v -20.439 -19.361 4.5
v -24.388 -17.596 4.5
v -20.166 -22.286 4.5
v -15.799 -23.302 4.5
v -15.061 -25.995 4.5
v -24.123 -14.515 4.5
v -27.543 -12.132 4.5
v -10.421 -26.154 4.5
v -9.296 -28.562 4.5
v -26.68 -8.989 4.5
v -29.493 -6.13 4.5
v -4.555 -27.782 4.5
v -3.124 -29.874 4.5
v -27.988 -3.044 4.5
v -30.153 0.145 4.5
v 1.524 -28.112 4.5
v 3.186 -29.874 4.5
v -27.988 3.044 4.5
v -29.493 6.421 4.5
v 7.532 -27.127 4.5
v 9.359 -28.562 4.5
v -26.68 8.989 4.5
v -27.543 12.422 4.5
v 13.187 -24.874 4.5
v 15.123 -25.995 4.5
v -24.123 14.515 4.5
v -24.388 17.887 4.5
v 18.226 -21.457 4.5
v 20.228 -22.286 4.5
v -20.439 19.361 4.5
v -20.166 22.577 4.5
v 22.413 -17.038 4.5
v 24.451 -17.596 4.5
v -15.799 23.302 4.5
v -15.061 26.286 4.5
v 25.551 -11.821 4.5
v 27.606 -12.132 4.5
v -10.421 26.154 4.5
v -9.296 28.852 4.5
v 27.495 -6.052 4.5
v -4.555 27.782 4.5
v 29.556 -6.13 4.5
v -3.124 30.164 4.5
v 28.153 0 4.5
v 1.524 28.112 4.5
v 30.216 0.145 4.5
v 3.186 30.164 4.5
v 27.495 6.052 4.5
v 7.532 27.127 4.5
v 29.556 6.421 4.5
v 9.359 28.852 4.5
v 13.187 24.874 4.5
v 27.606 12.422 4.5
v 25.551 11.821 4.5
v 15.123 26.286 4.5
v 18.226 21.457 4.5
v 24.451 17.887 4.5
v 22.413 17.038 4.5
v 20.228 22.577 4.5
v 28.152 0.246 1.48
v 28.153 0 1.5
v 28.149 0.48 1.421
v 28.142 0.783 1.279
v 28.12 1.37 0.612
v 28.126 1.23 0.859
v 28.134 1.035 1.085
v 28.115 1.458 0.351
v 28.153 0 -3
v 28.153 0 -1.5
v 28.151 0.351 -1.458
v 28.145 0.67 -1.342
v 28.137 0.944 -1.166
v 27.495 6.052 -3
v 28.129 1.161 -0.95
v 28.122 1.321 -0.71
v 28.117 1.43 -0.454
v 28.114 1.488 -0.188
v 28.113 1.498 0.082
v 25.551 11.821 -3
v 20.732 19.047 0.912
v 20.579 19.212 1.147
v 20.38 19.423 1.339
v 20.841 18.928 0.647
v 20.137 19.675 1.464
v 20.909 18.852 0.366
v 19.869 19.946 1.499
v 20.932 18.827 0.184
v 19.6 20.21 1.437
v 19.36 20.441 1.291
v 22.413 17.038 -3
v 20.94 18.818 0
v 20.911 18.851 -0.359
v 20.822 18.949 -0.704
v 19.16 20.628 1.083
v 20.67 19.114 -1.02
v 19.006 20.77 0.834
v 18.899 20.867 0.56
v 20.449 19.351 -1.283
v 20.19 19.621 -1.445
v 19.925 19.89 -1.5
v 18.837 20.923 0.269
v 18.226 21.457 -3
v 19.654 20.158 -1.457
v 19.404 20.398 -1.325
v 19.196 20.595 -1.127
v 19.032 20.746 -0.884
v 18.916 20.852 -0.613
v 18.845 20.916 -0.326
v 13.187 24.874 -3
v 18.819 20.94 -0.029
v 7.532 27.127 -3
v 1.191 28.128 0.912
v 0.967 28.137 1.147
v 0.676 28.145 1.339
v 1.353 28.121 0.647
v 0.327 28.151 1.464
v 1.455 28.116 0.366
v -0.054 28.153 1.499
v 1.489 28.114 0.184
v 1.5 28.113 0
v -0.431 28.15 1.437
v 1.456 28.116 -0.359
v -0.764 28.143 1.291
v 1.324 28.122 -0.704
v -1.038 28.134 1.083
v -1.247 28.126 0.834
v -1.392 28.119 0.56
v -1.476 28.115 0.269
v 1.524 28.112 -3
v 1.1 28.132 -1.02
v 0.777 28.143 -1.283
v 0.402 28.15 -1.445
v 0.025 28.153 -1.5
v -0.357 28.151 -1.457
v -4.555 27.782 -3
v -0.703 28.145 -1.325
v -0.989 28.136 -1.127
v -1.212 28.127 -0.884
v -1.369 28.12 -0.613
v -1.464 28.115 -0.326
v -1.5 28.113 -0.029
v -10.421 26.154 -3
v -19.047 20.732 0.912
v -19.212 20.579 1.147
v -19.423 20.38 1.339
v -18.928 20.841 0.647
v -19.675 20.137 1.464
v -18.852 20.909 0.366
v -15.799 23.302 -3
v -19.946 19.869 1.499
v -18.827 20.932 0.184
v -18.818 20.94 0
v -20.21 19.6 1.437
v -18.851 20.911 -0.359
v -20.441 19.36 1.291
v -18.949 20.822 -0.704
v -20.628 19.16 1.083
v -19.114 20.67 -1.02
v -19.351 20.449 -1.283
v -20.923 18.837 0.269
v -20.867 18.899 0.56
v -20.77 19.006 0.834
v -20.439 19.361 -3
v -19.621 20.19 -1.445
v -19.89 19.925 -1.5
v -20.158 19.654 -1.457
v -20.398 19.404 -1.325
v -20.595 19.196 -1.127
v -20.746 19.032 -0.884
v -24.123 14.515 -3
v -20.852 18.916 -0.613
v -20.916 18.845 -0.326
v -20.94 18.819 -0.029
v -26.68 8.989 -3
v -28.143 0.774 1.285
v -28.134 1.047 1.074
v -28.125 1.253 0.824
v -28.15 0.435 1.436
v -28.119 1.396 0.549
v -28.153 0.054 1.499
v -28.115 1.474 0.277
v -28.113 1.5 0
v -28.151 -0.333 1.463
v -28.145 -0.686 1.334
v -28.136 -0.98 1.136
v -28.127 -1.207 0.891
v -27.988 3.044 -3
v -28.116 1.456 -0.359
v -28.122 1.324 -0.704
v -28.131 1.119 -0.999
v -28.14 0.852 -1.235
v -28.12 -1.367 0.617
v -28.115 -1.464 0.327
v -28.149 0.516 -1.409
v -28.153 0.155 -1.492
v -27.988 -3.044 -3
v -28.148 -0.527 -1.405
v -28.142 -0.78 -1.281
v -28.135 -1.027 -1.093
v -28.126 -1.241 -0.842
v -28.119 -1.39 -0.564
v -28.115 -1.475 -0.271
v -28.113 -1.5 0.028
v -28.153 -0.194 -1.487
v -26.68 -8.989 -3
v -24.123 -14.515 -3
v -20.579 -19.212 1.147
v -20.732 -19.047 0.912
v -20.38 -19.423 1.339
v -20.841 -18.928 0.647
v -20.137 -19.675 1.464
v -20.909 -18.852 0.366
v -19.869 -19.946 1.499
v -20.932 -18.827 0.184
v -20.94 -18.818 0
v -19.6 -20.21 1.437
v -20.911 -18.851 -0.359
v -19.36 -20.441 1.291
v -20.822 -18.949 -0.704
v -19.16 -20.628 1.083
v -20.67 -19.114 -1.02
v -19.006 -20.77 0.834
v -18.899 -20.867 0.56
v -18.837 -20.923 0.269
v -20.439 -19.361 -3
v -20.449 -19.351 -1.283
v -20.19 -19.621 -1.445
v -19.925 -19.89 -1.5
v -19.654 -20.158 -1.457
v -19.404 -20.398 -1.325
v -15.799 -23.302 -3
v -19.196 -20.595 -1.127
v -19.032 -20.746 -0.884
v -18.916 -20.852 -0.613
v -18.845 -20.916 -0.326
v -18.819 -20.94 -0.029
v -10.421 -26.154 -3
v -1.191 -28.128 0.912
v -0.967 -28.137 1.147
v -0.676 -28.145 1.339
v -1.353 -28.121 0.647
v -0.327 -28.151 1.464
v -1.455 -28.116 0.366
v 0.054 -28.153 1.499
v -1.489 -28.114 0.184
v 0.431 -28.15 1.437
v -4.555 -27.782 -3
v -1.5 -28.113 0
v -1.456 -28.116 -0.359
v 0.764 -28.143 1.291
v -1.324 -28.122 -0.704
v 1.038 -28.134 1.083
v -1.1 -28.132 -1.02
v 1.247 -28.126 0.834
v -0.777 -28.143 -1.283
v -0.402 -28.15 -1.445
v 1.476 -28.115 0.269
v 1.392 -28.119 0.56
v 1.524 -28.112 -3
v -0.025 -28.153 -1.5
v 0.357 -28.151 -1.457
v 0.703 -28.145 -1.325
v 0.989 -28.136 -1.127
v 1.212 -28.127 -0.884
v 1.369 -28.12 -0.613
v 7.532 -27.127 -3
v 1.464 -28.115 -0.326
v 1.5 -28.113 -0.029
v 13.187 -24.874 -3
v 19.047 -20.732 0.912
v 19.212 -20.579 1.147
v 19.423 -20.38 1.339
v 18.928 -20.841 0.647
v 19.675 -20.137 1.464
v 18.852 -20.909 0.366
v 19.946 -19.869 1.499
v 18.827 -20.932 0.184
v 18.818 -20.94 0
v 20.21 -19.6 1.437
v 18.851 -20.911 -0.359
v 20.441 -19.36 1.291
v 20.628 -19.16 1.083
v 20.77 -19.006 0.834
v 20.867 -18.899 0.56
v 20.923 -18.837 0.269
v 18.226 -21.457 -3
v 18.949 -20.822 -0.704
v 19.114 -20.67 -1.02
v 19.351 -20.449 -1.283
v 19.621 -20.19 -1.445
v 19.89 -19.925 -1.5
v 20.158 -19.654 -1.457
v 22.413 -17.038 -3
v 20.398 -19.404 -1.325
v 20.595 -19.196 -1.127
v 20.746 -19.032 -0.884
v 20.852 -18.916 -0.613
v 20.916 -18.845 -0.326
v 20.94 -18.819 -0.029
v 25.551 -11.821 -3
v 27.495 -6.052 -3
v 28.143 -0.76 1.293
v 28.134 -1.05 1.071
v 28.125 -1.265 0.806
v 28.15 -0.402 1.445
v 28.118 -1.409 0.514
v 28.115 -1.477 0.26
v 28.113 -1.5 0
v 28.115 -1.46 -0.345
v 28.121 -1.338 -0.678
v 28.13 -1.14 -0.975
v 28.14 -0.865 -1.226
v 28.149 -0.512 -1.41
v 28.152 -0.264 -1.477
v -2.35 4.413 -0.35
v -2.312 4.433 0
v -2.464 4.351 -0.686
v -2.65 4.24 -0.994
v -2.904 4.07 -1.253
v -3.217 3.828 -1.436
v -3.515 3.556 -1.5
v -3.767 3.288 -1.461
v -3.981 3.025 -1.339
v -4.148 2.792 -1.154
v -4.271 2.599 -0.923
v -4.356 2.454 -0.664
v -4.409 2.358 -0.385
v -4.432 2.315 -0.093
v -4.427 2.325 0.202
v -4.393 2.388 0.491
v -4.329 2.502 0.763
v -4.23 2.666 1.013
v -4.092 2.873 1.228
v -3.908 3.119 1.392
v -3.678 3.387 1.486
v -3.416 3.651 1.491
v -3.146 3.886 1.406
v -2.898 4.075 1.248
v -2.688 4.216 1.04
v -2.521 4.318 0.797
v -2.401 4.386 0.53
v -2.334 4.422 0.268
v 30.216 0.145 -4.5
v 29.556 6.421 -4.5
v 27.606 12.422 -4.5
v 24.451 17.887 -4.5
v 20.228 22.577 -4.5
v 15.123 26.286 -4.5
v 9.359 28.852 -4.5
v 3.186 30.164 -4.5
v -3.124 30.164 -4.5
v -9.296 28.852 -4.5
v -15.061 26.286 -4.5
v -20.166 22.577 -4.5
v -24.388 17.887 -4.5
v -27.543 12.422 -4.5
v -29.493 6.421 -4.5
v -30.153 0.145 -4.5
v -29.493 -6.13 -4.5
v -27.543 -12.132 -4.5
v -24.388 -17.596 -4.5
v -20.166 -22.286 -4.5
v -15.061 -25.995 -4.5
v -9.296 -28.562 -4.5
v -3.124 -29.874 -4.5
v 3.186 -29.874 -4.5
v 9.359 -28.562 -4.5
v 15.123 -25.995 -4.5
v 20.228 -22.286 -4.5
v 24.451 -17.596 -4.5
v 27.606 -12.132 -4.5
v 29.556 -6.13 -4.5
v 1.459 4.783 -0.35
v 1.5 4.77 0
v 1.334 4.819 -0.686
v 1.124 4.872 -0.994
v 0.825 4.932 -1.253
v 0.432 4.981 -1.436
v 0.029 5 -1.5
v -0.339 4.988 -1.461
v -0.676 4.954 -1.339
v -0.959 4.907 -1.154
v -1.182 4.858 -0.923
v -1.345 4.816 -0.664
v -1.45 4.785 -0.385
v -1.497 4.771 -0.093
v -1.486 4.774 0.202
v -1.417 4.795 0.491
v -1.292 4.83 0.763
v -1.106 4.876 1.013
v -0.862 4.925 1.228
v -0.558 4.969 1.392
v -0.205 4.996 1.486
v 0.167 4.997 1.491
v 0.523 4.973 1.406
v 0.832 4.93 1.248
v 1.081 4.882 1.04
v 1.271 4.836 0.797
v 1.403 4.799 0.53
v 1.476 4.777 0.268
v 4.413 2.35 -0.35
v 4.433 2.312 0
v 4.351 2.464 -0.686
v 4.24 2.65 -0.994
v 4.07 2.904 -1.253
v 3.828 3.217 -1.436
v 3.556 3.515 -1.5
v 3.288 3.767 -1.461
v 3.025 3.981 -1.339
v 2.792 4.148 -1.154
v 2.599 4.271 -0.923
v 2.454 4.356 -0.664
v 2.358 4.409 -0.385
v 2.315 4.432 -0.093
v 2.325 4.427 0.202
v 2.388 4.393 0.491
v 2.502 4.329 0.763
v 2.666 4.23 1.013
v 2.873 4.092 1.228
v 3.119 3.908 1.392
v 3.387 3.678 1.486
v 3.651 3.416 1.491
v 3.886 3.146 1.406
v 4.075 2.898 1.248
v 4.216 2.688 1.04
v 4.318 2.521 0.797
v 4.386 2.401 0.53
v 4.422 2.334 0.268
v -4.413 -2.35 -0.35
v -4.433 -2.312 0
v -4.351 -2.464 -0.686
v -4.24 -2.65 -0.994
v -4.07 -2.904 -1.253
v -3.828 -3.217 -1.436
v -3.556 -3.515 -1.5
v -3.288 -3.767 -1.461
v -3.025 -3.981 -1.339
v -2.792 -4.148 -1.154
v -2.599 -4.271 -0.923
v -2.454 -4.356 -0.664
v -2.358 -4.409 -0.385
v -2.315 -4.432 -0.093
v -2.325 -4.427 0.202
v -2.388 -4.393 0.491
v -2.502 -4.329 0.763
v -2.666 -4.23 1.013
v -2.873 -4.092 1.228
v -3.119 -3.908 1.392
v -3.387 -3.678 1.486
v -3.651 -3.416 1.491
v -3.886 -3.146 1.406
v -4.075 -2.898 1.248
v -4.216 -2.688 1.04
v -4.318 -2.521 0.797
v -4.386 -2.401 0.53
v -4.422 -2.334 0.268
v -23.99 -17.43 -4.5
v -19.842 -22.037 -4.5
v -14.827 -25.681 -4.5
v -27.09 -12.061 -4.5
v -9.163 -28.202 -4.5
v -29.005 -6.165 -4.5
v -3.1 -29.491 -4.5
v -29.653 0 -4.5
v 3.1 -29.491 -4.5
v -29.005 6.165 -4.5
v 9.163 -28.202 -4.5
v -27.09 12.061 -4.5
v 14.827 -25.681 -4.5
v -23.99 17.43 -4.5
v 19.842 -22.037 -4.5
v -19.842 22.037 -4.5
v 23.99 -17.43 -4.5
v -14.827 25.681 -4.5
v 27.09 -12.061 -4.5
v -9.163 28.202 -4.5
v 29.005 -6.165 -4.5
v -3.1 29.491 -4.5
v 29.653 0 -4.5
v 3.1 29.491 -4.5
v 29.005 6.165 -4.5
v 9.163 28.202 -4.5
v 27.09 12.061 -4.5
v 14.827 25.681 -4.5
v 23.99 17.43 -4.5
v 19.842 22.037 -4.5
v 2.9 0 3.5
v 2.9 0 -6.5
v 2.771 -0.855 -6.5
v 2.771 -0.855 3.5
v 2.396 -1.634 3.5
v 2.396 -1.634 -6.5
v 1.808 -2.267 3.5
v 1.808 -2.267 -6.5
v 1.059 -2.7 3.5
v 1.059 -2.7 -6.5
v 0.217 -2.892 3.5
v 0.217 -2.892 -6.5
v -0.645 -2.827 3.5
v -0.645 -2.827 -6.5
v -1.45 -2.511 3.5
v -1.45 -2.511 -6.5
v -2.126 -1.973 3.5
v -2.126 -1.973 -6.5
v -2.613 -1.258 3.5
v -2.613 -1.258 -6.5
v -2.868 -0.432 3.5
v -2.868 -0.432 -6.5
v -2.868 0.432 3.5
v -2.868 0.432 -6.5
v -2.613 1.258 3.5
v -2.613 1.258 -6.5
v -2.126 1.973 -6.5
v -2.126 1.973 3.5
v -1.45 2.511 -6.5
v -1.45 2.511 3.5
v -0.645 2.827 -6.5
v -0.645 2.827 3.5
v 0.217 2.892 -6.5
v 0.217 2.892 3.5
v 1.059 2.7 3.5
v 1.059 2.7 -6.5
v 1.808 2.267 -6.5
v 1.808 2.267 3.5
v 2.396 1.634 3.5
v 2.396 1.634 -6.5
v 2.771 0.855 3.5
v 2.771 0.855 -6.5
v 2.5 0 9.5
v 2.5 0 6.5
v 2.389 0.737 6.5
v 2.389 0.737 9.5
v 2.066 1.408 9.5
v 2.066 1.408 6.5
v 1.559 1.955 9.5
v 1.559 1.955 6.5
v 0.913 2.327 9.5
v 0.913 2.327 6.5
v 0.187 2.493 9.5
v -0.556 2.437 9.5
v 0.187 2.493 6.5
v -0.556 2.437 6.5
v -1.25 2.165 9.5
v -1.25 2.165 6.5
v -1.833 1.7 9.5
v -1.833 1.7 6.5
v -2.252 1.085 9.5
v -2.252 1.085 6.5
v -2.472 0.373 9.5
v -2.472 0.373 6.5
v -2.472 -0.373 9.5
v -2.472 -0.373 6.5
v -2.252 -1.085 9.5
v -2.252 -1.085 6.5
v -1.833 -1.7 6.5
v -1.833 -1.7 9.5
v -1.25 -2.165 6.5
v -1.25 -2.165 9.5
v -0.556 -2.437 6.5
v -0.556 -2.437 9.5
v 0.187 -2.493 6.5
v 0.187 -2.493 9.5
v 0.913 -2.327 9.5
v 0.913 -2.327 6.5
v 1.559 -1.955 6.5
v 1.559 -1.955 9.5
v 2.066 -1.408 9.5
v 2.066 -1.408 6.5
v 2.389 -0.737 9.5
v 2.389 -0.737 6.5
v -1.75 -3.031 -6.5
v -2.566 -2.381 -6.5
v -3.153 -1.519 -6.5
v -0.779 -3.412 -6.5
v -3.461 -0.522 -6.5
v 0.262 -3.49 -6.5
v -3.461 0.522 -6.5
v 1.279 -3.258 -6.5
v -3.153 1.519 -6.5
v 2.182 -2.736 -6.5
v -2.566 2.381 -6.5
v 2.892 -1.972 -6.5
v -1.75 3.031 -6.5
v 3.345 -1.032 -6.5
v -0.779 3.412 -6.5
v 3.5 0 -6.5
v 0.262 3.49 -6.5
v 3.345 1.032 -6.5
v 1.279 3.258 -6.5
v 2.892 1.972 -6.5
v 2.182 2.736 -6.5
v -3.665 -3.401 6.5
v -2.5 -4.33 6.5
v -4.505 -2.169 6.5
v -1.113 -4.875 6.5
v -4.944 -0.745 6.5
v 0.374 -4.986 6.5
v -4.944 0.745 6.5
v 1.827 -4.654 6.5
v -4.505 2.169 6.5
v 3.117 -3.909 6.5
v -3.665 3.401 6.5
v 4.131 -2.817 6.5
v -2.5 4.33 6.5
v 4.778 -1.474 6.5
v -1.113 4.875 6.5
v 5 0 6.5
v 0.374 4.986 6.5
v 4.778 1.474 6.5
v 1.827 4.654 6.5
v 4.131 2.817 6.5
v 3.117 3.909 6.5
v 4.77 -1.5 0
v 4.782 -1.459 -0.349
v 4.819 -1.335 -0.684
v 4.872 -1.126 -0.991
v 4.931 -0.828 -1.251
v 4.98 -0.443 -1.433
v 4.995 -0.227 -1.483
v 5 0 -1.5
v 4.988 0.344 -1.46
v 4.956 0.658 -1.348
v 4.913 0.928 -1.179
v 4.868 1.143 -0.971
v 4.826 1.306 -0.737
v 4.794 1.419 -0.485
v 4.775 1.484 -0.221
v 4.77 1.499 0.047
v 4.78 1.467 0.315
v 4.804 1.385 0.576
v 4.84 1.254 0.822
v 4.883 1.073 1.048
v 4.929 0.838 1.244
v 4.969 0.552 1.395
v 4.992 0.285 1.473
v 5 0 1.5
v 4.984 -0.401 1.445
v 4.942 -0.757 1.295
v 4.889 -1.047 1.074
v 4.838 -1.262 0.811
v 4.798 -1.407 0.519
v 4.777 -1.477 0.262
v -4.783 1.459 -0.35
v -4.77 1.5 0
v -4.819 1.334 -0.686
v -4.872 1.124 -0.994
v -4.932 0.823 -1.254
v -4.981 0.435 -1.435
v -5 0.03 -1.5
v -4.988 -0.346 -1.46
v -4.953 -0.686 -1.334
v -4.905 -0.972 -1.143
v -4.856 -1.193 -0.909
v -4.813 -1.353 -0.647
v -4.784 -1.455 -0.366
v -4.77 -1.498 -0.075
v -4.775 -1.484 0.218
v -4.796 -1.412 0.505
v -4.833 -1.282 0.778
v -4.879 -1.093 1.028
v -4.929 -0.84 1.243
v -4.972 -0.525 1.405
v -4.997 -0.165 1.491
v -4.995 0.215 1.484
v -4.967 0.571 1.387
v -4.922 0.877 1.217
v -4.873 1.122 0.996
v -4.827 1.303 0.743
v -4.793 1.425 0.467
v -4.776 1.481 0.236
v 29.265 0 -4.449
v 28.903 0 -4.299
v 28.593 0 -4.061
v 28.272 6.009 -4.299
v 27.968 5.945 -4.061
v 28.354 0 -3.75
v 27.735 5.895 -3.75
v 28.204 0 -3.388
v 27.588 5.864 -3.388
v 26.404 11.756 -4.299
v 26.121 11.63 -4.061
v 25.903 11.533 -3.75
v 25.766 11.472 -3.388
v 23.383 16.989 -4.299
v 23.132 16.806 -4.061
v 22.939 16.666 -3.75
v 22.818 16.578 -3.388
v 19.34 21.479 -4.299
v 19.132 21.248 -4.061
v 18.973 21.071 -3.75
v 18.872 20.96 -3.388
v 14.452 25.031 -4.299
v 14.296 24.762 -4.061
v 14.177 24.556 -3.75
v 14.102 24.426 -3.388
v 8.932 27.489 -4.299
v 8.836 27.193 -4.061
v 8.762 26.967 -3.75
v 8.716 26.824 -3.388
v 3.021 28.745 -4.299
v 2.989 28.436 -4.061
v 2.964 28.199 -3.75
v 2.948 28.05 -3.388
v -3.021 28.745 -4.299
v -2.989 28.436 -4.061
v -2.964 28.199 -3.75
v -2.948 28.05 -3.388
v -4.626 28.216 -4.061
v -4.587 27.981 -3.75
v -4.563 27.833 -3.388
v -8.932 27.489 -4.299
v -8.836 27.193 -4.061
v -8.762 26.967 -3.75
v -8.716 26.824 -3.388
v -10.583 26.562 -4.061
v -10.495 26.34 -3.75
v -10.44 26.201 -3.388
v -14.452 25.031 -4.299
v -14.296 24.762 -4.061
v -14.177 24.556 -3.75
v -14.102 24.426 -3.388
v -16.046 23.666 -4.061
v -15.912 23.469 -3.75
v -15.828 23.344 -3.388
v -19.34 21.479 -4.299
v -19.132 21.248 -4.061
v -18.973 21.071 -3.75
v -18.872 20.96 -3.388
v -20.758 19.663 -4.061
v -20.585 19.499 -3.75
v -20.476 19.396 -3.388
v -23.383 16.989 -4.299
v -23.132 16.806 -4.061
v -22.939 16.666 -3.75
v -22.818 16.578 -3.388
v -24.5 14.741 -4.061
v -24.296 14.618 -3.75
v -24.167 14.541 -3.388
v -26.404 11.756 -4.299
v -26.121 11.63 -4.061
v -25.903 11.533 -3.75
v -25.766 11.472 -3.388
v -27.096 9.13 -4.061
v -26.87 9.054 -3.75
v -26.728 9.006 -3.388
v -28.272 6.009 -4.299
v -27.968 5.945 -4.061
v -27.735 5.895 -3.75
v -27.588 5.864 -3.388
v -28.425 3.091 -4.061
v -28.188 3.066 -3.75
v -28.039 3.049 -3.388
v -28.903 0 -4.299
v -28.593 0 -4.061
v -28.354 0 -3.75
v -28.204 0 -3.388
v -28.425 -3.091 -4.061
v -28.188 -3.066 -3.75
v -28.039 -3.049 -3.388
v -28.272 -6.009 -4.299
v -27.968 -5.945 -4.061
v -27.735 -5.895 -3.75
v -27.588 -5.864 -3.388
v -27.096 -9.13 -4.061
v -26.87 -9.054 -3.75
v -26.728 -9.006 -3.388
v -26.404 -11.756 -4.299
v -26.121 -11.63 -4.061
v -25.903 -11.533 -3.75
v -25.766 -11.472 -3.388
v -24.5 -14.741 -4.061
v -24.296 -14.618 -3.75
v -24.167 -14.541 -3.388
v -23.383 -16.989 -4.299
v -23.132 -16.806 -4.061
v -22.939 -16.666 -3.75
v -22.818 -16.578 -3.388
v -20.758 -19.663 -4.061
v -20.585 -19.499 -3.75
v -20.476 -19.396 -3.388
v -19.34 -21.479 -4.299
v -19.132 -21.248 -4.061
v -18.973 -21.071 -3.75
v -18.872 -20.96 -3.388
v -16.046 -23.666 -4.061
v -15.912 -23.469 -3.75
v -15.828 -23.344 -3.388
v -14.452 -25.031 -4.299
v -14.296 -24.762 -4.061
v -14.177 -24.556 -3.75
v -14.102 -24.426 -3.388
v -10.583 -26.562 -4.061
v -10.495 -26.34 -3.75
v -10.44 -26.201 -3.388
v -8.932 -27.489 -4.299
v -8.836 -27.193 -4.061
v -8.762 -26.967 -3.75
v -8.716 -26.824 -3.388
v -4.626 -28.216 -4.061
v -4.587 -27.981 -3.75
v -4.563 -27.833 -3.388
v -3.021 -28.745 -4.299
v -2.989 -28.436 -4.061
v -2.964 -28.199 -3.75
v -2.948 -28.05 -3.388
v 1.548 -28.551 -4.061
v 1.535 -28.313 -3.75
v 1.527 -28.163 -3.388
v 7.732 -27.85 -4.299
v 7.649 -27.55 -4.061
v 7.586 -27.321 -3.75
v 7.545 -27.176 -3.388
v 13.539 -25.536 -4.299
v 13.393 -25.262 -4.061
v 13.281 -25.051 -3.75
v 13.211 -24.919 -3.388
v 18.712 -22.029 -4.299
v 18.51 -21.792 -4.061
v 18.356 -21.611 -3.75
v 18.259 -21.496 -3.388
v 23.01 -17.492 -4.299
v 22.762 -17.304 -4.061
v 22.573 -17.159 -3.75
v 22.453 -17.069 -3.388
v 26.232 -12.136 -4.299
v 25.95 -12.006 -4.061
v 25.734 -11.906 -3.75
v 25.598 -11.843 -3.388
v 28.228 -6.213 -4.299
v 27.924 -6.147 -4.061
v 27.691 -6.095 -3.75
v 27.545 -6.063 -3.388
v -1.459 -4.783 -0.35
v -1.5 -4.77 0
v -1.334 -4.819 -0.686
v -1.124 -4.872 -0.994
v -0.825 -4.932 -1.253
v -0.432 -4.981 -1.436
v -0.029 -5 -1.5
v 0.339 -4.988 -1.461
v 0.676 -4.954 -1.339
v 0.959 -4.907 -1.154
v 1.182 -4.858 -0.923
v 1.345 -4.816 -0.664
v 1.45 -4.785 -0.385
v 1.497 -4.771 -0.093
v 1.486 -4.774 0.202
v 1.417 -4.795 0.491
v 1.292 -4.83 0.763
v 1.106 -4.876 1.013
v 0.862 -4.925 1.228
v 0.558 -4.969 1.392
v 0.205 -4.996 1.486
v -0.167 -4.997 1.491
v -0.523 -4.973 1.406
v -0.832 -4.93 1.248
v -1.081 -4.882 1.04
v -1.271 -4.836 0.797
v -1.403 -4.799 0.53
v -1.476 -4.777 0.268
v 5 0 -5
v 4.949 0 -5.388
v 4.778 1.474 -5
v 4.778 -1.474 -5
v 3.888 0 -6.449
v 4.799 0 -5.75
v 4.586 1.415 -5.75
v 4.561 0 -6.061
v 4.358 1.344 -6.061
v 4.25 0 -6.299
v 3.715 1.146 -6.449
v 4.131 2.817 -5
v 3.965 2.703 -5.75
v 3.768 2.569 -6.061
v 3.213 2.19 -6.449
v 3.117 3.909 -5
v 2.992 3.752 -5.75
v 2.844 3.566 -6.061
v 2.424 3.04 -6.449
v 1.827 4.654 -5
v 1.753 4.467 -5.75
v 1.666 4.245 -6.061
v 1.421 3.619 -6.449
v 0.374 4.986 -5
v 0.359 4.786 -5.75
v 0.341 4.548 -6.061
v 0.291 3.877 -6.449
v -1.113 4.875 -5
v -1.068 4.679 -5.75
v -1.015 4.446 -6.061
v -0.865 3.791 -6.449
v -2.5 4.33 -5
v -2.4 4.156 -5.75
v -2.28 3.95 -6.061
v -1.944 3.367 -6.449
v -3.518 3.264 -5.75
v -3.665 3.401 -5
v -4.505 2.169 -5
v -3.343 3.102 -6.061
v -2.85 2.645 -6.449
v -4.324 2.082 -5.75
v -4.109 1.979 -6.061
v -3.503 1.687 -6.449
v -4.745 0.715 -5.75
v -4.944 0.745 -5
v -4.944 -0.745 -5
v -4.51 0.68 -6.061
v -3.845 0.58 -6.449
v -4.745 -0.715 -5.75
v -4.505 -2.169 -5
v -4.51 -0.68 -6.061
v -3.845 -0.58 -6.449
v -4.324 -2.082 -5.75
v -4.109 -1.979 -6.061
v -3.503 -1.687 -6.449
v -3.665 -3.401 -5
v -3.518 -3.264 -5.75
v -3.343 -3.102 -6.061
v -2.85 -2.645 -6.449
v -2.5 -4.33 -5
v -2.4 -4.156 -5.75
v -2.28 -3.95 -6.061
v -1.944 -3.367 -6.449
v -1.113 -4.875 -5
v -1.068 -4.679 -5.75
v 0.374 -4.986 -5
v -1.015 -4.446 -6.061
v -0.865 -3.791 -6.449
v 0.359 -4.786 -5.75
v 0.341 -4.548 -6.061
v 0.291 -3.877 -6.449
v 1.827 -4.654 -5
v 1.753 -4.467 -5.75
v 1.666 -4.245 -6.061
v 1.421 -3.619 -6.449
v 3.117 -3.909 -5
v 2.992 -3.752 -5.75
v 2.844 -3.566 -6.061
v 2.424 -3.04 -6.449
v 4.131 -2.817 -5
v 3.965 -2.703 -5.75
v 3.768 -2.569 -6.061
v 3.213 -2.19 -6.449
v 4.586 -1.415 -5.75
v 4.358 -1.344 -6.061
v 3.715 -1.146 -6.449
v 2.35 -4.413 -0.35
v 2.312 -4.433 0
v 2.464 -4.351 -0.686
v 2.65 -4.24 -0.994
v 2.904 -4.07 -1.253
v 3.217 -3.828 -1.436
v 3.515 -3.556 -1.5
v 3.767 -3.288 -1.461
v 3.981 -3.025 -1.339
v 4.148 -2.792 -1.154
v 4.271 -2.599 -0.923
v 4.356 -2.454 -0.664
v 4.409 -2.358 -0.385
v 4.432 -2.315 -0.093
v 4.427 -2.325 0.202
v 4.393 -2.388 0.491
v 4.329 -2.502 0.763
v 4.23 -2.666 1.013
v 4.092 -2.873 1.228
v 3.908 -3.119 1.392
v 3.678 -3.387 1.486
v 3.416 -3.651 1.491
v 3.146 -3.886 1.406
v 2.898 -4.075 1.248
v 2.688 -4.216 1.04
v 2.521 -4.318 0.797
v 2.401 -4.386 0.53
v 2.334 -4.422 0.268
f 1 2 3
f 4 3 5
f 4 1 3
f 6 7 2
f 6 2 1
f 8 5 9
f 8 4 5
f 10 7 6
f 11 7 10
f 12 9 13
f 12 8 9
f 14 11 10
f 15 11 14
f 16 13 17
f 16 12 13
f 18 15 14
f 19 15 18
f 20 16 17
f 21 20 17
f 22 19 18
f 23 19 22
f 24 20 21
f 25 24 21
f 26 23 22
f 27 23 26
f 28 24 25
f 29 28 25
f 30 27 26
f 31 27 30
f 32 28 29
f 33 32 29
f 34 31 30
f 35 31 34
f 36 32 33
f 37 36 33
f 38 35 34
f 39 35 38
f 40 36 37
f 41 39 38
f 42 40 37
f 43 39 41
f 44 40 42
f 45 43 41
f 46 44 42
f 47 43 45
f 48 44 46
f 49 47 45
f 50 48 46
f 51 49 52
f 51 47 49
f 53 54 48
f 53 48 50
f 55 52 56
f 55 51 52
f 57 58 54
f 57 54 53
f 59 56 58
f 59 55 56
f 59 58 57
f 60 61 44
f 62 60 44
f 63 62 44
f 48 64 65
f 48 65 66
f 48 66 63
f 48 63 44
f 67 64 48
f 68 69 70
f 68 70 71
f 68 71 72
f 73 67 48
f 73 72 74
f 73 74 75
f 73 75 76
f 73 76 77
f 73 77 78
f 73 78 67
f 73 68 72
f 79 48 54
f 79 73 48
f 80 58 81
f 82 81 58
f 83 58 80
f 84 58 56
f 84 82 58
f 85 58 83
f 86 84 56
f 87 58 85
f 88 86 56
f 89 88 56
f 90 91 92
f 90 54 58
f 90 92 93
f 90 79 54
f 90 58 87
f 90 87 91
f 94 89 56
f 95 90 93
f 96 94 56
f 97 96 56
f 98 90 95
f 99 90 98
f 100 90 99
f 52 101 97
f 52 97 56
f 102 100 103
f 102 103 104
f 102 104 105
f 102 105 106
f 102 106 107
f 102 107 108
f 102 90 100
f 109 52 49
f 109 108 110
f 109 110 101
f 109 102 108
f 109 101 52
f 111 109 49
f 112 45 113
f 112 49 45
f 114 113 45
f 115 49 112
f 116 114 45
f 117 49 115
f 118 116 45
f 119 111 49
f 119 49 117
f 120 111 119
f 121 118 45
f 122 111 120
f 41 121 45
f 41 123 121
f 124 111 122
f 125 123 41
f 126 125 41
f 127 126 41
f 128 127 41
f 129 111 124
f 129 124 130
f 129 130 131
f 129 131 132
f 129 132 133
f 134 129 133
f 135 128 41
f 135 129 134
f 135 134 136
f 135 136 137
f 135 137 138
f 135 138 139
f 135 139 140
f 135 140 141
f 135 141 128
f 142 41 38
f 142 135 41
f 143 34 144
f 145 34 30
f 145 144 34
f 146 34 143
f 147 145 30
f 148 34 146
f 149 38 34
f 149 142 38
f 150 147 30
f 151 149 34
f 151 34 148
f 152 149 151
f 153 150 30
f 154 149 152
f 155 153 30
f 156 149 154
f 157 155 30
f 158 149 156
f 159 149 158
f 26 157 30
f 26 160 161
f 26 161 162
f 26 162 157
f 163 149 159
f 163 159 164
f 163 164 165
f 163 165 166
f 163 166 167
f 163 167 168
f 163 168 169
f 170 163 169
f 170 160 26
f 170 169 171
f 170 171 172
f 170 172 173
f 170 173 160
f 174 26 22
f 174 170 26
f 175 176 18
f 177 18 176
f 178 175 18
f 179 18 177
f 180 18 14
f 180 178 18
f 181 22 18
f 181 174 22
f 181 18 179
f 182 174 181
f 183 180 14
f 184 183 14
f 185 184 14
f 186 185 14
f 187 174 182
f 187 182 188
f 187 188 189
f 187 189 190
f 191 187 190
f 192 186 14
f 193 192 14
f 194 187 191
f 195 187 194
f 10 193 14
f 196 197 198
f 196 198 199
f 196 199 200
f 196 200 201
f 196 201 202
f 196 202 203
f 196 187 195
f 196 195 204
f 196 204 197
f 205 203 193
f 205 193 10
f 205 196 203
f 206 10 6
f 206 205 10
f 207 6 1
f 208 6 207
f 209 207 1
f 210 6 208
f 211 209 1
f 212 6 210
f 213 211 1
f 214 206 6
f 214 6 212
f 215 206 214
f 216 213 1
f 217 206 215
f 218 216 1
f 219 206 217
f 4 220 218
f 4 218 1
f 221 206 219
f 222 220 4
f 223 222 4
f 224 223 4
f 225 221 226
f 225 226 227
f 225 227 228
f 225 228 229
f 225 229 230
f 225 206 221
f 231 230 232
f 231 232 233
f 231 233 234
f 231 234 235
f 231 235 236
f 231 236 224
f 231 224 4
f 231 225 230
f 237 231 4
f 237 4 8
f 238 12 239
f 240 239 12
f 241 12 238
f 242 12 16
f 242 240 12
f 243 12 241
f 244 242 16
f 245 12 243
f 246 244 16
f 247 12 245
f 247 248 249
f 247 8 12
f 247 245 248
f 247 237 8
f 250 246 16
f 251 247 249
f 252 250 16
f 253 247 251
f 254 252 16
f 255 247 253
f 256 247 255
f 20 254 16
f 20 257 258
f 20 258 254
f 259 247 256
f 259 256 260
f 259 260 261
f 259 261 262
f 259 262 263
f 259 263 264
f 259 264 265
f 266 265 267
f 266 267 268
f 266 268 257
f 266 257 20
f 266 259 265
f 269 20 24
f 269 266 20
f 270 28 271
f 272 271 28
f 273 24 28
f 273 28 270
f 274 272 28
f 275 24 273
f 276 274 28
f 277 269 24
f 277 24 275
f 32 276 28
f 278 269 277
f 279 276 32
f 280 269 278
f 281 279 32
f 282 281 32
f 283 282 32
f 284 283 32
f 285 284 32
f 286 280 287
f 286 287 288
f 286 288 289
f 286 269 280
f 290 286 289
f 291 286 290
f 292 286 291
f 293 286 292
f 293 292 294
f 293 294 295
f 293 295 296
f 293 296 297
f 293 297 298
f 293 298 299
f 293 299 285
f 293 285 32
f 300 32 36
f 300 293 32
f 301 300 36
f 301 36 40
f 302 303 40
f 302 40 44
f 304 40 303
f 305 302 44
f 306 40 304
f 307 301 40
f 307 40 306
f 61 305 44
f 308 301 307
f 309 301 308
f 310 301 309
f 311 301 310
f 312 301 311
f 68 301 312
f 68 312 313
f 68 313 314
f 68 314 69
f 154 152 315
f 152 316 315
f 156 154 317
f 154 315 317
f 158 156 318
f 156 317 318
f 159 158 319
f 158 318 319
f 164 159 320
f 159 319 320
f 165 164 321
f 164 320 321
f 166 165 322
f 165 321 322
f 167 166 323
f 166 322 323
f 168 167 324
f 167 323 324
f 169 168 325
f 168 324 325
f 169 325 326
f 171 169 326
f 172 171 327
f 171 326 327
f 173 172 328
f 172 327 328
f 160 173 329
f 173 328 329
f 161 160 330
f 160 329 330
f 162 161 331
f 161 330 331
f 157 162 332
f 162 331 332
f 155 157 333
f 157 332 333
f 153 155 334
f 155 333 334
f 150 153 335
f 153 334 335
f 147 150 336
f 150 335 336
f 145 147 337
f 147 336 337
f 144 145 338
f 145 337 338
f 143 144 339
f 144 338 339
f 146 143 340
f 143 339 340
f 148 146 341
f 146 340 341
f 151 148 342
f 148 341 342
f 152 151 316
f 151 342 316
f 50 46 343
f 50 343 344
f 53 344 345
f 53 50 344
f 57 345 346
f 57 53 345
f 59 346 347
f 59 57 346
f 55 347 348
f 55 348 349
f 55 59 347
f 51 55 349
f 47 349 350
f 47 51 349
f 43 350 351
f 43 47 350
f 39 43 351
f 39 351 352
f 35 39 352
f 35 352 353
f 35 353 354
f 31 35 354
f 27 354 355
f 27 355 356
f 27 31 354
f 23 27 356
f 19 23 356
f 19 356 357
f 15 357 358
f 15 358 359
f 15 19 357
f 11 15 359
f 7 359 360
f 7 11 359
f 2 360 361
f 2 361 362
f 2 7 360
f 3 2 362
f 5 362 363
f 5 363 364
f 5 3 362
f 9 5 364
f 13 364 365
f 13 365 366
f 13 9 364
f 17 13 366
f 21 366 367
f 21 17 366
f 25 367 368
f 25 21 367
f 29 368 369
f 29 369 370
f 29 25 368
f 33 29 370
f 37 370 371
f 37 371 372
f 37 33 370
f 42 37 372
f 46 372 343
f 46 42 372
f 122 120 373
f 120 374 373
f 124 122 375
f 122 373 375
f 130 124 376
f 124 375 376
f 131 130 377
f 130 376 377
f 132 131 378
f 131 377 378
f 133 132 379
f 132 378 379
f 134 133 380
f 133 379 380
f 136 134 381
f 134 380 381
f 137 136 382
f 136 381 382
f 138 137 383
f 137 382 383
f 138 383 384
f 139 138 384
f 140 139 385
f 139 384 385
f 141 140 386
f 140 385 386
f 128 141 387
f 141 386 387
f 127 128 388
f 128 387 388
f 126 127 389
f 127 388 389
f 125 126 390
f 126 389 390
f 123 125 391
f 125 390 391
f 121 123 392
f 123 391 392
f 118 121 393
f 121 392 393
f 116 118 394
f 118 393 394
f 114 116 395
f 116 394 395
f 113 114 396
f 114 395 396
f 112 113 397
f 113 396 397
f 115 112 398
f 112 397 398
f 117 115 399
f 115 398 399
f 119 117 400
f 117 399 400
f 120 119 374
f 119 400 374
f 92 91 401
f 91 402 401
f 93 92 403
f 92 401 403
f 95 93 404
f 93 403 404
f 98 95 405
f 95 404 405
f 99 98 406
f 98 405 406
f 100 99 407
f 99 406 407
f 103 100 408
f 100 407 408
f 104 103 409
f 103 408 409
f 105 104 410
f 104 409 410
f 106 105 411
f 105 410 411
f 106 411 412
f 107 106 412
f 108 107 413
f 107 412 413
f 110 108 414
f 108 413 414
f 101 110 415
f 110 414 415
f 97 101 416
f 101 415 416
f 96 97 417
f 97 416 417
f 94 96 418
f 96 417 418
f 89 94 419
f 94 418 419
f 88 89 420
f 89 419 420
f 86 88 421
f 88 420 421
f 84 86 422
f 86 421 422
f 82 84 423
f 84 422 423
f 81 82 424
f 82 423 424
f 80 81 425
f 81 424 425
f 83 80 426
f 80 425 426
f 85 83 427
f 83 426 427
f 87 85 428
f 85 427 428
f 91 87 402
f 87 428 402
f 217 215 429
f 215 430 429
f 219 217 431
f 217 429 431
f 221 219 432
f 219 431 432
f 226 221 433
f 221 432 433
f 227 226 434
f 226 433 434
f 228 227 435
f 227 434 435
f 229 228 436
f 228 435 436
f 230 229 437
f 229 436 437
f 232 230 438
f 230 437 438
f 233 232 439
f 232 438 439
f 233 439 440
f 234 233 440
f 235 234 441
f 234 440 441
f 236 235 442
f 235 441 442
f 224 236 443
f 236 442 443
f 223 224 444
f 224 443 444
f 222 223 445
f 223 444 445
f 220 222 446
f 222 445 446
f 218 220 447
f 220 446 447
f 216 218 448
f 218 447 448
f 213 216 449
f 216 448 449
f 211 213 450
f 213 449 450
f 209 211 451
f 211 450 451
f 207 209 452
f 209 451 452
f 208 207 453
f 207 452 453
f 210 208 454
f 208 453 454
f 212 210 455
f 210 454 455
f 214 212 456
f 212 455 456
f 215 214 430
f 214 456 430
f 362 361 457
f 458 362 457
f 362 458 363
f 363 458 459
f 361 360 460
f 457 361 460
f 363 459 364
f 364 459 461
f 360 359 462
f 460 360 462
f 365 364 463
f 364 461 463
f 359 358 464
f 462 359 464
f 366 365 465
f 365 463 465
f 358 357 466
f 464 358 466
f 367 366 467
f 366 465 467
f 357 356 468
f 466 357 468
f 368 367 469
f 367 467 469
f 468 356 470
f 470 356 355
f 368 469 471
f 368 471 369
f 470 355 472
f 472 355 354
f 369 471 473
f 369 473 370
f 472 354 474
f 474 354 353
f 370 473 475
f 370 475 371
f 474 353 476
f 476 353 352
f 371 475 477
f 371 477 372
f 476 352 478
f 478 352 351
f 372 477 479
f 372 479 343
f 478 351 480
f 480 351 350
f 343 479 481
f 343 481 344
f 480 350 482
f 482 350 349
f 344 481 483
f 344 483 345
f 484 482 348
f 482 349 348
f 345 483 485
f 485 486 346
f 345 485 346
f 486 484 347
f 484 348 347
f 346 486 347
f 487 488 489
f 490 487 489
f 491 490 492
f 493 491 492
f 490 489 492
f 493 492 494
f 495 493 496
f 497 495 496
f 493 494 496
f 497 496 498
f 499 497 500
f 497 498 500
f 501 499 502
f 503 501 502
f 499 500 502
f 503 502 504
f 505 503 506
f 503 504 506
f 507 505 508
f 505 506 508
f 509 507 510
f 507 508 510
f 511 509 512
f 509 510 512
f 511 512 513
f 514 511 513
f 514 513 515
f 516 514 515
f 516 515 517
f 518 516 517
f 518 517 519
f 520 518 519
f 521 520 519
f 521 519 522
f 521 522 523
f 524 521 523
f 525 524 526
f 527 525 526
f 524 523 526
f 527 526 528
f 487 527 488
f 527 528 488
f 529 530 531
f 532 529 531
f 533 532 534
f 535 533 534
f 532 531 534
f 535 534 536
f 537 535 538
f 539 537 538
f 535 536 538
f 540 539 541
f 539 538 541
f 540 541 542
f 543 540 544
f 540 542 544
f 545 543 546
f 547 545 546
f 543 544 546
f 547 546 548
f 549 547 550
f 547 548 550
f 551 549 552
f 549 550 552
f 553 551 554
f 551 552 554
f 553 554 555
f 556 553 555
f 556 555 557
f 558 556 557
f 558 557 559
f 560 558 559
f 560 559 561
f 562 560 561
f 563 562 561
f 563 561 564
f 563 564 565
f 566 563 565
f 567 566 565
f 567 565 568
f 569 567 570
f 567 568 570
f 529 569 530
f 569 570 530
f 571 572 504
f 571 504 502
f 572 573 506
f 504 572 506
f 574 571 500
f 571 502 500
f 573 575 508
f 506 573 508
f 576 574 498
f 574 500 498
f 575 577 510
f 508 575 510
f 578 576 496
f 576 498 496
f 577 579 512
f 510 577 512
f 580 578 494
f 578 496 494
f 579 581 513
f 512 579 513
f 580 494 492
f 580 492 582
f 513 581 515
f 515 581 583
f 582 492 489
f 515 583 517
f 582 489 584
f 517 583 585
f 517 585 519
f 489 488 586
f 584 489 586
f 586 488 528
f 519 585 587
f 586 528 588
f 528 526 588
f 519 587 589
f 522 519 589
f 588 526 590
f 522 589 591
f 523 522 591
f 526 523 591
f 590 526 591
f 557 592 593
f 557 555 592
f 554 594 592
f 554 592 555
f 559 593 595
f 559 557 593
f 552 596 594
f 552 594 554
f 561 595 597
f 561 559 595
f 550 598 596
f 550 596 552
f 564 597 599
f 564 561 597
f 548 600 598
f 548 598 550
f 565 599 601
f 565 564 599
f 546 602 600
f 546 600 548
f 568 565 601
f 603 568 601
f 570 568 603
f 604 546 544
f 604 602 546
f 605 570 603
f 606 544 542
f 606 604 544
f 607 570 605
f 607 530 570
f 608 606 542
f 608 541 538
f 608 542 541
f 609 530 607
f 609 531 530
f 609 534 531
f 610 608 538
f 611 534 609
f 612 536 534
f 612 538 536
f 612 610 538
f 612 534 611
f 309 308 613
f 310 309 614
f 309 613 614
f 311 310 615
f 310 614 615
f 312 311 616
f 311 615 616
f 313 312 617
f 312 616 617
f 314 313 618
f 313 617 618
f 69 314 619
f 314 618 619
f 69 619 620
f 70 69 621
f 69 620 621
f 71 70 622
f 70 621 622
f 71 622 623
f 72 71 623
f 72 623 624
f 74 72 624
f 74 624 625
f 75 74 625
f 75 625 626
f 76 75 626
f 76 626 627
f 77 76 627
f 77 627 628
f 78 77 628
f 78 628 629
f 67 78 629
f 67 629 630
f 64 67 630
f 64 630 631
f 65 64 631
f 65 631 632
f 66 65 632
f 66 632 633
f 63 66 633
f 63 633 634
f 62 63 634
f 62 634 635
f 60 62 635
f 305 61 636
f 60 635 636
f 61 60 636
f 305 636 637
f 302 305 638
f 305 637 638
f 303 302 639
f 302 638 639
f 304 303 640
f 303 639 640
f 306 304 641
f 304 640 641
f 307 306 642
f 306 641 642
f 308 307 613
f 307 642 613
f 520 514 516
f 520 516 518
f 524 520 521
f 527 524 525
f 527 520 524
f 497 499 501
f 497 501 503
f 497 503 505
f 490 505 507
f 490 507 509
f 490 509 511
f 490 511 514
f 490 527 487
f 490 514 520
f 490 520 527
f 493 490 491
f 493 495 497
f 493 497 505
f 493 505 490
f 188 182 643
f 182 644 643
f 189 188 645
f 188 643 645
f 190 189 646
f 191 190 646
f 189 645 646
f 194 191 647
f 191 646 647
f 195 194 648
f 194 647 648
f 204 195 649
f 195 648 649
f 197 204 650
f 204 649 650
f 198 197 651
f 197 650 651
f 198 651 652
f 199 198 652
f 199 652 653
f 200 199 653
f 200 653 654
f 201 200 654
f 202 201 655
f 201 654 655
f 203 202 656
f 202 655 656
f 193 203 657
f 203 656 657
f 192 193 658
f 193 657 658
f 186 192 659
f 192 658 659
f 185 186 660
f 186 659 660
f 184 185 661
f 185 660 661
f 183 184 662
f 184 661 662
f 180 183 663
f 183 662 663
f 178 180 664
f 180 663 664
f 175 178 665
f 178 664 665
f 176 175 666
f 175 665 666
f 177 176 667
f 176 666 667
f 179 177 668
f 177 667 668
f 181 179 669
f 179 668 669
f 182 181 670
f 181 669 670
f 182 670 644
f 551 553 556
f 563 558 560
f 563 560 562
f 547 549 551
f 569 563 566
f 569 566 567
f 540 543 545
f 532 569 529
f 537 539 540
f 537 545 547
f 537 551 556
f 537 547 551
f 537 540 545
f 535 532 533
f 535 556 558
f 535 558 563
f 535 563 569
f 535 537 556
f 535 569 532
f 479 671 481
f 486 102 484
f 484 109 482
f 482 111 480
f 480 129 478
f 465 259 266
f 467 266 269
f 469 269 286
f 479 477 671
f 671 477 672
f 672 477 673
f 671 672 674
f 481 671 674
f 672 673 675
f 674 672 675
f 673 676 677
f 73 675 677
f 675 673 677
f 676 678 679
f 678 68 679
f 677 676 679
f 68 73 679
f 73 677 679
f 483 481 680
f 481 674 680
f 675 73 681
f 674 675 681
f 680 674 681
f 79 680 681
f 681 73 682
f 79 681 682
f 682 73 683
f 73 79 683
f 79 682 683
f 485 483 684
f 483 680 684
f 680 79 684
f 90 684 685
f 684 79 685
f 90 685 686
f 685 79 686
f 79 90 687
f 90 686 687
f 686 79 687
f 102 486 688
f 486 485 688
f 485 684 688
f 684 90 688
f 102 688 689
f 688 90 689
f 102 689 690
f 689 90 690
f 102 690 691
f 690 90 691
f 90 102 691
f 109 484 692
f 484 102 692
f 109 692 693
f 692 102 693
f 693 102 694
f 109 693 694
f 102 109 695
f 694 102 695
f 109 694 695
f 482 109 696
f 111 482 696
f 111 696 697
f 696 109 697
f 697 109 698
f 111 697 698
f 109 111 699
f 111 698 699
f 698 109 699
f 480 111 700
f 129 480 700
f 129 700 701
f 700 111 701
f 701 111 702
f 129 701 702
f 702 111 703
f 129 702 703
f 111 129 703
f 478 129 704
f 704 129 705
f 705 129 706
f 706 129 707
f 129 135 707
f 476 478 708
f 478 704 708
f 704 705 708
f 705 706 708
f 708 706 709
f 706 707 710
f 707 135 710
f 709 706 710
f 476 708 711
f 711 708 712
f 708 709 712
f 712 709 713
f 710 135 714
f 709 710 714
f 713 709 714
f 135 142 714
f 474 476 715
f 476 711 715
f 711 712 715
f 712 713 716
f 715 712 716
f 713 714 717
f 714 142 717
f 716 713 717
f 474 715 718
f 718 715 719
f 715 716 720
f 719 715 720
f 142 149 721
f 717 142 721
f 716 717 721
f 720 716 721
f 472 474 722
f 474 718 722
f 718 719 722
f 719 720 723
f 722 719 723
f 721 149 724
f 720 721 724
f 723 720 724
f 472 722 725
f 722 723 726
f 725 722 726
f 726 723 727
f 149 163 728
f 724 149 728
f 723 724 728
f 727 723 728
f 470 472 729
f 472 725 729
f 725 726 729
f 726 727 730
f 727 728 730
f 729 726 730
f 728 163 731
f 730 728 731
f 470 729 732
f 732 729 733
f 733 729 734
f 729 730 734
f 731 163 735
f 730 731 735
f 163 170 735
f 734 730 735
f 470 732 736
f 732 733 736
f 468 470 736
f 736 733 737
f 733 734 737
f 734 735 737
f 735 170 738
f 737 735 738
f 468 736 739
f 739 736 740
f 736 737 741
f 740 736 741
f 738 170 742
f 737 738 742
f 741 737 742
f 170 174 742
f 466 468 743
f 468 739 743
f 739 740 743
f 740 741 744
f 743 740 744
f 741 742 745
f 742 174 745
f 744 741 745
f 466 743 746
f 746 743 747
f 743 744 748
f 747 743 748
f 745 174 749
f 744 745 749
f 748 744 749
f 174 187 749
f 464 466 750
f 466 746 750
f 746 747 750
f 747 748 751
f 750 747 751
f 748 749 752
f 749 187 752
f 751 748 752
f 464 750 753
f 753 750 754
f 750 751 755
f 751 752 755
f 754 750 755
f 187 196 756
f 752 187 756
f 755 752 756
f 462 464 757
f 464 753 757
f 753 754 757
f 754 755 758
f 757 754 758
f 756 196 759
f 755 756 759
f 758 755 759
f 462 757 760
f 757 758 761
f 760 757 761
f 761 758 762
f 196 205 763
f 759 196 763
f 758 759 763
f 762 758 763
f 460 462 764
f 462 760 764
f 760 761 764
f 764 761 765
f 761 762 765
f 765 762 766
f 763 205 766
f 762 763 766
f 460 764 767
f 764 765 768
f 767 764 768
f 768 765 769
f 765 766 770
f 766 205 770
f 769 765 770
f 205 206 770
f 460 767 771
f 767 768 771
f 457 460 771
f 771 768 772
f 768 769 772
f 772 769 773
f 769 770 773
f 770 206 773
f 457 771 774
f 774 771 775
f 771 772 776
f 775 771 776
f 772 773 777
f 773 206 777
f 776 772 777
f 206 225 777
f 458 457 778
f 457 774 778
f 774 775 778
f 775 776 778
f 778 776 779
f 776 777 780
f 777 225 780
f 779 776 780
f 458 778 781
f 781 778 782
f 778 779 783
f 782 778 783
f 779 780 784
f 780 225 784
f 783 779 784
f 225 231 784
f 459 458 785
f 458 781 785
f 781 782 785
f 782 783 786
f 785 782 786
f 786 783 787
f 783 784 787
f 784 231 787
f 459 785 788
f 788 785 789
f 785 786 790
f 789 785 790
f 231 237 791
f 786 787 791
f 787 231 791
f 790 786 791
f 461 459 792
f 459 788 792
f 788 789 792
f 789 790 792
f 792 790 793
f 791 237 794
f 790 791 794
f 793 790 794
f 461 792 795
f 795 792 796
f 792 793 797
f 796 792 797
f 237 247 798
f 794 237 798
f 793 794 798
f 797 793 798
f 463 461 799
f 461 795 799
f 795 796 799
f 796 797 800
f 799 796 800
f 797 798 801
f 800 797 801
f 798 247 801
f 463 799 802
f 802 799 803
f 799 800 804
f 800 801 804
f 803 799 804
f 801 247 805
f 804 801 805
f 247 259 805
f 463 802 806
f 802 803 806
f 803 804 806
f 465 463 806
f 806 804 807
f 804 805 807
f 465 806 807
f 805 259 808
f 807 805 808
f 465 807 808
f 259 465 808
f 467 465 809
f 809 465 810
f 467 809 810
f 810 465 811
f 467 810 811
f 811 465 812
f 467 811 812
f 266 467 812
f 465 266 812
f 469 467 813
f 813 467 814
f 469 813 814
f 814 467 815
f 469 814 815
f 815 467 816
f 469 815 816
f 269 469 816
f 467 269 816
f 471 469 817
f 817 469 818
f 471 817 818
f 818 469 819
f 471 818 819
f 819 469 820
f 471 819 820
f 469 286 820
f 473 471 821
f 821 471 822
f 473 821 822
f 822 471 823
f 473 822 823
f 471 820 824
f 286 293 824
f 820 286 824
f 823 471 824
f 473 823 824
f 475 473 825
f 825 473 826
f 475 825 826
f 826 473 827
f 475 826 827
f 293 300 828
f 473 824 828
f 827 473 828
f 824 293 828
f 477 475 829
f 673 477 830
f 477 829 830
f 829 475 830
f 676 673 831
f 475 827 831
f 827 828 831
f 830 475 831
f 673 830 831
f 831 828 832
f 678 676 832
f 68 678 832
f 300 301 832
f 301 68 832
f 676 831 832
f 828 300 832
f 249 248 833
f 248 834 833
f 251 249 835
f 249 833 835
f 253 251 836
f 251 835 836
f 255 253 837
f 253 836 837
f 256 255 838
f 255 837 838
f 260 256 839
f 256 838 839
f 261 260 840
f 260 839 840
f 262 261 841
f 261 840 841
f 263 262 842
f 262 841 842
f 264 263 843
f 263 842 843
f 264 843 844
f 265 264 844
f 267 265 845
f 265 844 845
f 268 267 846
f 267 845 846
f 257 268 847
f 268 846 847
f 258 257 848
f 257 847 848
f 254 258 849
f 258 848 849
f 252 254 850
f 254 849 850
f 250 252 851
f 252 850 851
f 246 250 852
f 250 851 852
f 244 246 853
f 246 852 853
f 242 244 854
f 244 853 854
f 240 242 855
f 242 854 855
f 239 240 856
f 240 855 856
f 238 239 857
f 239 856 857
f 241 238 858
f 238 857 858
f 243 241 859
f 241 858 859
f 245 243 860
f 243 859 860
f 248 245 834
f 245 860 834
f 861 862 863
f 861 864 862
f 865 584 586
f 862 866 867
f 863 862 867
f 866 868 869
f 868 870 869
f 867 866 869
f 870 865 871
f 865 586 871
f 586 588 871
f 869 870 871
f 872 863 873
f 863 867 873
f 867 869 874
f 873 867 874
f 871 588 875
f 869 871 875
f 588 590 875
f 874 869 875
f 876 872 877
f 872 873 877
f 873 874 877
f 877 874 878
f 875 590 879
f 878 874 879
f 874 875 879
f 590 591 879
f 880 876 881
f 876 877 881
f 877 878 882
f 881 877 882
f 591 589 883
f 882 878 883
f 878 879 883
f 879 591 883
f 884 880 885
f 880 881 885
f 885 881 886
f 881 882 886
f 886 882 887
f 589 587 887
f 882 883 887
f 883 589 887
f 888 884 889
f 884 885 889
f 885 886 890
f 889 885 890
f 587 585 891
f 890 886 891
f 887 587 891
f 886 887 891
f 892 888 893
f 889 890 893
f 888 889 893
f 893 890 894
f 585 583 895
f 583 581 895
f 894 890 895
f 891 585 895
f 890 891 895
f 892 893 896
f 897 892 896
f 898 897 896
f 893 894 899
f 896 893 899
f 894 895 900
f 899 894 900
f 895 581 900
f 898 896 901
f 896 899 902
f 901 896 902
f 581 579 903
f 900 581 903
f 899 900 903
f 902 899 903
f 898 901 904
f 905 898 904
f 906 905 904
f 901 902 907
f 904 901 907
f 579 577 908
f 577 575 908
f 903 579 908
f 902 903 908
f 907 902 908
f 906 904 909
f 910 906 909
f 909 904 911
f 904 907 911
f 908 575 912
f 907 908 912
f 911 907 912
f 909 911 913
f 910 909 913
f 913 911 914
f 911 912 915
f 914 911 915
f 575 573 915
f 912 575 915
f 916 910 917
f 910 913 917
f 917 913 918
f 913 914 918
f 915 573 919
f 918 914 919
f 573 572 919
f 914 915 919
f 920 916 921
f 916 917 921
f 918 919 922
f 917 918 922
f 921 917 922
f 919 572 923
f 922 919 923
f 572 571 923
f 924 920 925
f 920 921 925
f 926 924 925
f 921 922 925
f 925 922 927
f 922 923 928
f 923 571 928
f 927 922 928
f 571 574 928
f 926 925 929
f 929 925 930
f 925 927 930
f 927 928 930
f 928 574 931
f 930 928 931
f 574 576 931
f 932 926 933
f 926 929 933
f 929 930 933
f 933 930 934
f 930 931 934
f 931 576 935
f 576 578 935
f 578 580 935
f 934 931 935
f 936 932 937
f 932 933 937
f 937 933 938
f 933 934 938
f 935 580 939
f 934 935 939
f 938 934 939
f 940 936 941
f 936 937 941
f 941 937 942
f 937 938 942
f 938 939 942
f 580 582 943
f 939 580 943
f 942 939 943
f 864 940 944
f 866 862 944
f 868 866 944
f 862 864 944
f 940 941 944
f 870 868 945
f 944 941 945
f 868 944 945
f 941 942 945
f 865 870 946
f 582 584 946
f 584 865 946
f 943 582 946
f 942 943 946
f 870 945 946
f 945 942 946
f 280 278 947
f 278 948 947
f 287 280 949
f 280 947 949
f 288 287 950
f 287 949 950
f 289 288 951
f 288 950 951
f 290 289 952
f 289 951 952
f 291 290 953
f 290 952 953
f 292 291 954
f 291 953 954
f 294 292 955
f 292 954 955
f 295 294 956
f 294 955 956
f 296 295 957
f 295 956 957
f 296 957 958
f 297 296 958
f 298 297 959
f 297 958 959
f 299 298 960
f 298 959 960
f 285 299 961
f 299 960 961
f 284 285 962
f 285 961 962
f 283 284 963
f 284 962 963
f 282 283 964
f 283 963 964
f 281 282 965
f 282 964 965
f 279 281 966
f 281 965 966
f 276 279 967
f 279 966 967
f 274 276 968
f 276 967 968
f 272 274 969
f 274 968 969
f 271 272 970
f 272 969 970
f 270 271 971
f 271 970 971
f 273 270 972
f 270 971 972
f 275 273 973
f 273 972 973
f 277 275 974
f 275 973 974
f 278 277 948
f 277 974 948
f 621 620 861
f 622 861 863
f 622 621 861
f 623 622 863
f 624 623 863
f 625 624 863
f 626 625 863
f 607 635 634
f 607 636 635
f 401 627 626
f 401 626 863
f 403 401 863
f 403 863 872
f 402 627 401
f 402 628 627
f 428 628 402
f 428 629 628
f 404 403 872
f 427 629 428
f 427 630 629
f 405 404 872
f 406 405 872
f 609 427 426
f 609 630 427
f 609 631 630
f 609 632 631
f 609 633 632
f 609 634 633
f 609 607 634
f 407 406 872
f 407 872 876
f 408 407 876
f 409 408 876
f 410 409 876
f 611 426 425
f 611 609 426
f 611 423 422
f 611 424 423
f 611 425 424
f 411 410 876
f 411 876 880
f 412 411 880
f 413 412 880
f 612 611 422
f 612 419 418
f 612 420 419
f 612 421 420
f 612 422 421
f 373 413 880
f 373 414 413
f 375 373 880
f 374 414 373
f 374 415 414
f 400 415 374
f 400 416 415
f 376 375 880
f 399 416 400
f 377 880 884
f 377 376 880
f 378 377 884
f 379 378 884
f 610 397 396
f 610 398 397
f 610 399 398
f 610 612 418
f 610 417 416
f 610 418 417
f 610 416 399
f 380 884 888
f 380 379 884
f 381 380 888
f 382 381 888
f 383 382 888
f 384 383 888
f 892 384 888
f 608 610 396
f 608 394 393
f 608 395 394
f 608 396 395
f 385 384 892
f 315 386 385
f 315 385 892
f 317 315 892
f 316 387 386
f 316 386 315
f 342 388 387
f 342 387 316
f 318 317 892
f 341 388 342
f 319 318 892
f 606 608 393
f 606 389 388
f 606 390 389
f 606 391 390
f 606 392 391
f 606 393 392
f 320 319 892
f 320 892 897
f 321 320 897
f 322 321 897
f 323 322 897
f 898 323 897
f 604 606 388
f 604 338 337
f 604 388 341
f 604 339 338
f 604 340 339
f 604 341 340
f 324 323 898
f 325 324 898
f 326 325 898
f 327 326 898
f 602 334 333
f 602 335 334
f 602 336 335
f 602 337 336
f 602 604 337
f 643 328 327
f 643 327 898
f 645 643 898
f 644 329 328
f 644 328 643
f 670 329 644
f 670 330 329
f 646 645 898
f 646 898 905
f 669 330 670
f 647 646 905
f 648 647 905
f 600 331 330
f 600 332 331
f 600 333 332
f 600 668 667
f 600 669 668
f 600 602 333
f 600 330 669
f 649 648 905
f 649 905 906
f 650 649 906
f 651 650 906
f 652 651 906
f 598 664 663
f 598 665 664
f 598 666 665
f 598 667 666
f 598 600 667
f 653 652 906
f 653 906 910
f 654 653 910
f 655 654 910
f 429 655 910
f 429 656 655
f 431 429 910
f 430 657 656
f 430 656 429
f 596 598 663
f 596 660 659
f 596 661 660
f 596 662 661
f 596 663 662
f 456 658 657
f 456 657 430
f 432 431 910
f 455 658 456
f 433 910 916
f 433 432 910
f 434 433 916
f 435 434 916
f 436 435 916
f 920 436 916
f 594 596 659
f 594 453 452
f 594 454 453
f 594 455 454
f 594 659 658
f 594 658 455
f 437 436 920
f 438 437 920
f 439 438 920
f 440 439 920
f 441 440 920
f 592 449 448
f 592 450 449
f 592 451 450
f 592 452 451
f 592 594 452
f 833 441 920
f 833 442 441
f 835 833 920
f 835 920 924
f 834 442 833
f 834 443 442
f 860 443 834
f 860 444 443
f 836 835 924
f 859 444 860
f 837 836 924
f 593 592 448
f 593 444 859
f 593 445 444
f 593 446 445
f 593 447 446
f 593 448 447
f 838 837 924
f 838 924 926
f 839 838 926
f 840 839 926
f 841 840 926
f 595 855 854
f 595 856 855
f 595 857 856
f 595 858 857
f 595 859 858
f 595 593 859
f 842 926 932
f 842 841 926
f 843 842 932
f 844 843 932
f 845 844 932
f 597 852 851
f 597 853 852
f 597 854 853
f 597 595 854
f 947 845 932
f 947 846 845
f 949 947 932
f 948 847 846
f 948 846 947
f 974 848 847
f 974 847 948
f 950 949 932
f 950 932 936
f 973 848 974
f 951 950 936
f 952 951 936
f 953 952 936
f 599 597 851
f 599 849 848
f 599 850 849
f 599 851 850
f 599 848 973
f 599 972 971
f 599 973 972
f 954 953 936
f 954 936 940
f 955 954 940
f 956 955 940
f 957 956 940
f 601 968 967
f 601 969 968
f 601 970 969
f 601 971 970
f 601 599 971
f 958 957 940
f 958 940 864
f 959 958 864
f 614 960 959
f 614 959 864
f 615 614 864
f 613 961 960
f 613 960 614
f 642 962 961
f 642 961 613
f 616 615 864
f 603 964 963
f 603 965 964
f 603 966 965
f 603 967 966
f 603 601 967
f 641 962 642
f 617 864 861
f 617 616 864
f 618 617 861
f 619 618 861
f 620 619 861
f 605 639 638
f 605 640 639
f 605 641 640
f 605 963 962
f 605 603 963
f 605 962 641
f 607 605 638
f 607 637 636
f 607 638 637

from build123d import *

# Parameters (mm, degrees)
F0_R            = 5
F1_DEPTH        = 6.5
F2_R            = 2.9
F3_DEPTH        = 10
F4_W            = 1.5
F4_H            = 25.2303039929
F5_COPIES_COUNT = 8
F6_R            = 30.1842300119
F6_R_2          = 28.1532988992
F7_DEPTH        = 4.5
F8_R            = 1.5
F9_R            = 2.5
F10_DEPTH       = 3


# Not quite as in the source:
# - a pattern or mirror of a feature is missing from the dataset's text; its kind, count and spacing are read off the source's solid


with BuildPart() as f1:
    # F0 (on Top) → F1 (new body, symmetric)
    with BuildSketch(Plane.XY):
        Circle(F0_R)
    extrude(amount=F1_DEPTH, both=True)

    # F2 (on face) → F3 (cut)
    with BuildSketch(Plane(origin=(0, 0, -6.5), x_dir=(1, 0, 0), z_dir=(0, 0, -1))):
        Circle(F2_R)
    extrude(amount=-F3_DEPTH, mode=Mode.SUBTRACT)

    # F4 (on Top) → F5 (revolve)
    with BuildSketch(Plane.XY):
        with Locations((-0.75, -17.3848480035)):
            Rectangle(F4_W, F4_H)
    f5 = revolve(axis=Axis((0, -23.260904476, 0), (0, -1, 0)))

    # F5_copies: F5 ×8 about axis
    f5_copies_axis = Axis((0, 0, 0), (0, 0, 1))
    for i in range(1, F5_COPIES_COUNT):
        add(f5.rotate(f5_copies_axis, i * 360 / F5_COPIES_COUNT))

    # F6 (on Top) → F7 (join, symmetric)
    with BuildSketch(Plane.XY):
        with Locations((0.0313063833, 0.1453618683)):
            Circle(F6_R)
        Circle(F6_R_2, mode=Mode.SUBTRACT)
    extrude(amount=F7_DEPTH, both=True)

    # F8
    f8_edges = [f1.edges().sort_by_distance(p)[0] for p in [
        (-5, 0, -6.5),
        (-28.153299, 0, -4.5),
    ]]
    fillet(f8_edges, radius=F8_R)

    # F9 (on face) → F10 (join)
    with BuildSketch(Plane.XY.offset(6.5)):
        Circle(F9_R)
    extrude(amount=F10_DEPTH)


solid = f1.part
